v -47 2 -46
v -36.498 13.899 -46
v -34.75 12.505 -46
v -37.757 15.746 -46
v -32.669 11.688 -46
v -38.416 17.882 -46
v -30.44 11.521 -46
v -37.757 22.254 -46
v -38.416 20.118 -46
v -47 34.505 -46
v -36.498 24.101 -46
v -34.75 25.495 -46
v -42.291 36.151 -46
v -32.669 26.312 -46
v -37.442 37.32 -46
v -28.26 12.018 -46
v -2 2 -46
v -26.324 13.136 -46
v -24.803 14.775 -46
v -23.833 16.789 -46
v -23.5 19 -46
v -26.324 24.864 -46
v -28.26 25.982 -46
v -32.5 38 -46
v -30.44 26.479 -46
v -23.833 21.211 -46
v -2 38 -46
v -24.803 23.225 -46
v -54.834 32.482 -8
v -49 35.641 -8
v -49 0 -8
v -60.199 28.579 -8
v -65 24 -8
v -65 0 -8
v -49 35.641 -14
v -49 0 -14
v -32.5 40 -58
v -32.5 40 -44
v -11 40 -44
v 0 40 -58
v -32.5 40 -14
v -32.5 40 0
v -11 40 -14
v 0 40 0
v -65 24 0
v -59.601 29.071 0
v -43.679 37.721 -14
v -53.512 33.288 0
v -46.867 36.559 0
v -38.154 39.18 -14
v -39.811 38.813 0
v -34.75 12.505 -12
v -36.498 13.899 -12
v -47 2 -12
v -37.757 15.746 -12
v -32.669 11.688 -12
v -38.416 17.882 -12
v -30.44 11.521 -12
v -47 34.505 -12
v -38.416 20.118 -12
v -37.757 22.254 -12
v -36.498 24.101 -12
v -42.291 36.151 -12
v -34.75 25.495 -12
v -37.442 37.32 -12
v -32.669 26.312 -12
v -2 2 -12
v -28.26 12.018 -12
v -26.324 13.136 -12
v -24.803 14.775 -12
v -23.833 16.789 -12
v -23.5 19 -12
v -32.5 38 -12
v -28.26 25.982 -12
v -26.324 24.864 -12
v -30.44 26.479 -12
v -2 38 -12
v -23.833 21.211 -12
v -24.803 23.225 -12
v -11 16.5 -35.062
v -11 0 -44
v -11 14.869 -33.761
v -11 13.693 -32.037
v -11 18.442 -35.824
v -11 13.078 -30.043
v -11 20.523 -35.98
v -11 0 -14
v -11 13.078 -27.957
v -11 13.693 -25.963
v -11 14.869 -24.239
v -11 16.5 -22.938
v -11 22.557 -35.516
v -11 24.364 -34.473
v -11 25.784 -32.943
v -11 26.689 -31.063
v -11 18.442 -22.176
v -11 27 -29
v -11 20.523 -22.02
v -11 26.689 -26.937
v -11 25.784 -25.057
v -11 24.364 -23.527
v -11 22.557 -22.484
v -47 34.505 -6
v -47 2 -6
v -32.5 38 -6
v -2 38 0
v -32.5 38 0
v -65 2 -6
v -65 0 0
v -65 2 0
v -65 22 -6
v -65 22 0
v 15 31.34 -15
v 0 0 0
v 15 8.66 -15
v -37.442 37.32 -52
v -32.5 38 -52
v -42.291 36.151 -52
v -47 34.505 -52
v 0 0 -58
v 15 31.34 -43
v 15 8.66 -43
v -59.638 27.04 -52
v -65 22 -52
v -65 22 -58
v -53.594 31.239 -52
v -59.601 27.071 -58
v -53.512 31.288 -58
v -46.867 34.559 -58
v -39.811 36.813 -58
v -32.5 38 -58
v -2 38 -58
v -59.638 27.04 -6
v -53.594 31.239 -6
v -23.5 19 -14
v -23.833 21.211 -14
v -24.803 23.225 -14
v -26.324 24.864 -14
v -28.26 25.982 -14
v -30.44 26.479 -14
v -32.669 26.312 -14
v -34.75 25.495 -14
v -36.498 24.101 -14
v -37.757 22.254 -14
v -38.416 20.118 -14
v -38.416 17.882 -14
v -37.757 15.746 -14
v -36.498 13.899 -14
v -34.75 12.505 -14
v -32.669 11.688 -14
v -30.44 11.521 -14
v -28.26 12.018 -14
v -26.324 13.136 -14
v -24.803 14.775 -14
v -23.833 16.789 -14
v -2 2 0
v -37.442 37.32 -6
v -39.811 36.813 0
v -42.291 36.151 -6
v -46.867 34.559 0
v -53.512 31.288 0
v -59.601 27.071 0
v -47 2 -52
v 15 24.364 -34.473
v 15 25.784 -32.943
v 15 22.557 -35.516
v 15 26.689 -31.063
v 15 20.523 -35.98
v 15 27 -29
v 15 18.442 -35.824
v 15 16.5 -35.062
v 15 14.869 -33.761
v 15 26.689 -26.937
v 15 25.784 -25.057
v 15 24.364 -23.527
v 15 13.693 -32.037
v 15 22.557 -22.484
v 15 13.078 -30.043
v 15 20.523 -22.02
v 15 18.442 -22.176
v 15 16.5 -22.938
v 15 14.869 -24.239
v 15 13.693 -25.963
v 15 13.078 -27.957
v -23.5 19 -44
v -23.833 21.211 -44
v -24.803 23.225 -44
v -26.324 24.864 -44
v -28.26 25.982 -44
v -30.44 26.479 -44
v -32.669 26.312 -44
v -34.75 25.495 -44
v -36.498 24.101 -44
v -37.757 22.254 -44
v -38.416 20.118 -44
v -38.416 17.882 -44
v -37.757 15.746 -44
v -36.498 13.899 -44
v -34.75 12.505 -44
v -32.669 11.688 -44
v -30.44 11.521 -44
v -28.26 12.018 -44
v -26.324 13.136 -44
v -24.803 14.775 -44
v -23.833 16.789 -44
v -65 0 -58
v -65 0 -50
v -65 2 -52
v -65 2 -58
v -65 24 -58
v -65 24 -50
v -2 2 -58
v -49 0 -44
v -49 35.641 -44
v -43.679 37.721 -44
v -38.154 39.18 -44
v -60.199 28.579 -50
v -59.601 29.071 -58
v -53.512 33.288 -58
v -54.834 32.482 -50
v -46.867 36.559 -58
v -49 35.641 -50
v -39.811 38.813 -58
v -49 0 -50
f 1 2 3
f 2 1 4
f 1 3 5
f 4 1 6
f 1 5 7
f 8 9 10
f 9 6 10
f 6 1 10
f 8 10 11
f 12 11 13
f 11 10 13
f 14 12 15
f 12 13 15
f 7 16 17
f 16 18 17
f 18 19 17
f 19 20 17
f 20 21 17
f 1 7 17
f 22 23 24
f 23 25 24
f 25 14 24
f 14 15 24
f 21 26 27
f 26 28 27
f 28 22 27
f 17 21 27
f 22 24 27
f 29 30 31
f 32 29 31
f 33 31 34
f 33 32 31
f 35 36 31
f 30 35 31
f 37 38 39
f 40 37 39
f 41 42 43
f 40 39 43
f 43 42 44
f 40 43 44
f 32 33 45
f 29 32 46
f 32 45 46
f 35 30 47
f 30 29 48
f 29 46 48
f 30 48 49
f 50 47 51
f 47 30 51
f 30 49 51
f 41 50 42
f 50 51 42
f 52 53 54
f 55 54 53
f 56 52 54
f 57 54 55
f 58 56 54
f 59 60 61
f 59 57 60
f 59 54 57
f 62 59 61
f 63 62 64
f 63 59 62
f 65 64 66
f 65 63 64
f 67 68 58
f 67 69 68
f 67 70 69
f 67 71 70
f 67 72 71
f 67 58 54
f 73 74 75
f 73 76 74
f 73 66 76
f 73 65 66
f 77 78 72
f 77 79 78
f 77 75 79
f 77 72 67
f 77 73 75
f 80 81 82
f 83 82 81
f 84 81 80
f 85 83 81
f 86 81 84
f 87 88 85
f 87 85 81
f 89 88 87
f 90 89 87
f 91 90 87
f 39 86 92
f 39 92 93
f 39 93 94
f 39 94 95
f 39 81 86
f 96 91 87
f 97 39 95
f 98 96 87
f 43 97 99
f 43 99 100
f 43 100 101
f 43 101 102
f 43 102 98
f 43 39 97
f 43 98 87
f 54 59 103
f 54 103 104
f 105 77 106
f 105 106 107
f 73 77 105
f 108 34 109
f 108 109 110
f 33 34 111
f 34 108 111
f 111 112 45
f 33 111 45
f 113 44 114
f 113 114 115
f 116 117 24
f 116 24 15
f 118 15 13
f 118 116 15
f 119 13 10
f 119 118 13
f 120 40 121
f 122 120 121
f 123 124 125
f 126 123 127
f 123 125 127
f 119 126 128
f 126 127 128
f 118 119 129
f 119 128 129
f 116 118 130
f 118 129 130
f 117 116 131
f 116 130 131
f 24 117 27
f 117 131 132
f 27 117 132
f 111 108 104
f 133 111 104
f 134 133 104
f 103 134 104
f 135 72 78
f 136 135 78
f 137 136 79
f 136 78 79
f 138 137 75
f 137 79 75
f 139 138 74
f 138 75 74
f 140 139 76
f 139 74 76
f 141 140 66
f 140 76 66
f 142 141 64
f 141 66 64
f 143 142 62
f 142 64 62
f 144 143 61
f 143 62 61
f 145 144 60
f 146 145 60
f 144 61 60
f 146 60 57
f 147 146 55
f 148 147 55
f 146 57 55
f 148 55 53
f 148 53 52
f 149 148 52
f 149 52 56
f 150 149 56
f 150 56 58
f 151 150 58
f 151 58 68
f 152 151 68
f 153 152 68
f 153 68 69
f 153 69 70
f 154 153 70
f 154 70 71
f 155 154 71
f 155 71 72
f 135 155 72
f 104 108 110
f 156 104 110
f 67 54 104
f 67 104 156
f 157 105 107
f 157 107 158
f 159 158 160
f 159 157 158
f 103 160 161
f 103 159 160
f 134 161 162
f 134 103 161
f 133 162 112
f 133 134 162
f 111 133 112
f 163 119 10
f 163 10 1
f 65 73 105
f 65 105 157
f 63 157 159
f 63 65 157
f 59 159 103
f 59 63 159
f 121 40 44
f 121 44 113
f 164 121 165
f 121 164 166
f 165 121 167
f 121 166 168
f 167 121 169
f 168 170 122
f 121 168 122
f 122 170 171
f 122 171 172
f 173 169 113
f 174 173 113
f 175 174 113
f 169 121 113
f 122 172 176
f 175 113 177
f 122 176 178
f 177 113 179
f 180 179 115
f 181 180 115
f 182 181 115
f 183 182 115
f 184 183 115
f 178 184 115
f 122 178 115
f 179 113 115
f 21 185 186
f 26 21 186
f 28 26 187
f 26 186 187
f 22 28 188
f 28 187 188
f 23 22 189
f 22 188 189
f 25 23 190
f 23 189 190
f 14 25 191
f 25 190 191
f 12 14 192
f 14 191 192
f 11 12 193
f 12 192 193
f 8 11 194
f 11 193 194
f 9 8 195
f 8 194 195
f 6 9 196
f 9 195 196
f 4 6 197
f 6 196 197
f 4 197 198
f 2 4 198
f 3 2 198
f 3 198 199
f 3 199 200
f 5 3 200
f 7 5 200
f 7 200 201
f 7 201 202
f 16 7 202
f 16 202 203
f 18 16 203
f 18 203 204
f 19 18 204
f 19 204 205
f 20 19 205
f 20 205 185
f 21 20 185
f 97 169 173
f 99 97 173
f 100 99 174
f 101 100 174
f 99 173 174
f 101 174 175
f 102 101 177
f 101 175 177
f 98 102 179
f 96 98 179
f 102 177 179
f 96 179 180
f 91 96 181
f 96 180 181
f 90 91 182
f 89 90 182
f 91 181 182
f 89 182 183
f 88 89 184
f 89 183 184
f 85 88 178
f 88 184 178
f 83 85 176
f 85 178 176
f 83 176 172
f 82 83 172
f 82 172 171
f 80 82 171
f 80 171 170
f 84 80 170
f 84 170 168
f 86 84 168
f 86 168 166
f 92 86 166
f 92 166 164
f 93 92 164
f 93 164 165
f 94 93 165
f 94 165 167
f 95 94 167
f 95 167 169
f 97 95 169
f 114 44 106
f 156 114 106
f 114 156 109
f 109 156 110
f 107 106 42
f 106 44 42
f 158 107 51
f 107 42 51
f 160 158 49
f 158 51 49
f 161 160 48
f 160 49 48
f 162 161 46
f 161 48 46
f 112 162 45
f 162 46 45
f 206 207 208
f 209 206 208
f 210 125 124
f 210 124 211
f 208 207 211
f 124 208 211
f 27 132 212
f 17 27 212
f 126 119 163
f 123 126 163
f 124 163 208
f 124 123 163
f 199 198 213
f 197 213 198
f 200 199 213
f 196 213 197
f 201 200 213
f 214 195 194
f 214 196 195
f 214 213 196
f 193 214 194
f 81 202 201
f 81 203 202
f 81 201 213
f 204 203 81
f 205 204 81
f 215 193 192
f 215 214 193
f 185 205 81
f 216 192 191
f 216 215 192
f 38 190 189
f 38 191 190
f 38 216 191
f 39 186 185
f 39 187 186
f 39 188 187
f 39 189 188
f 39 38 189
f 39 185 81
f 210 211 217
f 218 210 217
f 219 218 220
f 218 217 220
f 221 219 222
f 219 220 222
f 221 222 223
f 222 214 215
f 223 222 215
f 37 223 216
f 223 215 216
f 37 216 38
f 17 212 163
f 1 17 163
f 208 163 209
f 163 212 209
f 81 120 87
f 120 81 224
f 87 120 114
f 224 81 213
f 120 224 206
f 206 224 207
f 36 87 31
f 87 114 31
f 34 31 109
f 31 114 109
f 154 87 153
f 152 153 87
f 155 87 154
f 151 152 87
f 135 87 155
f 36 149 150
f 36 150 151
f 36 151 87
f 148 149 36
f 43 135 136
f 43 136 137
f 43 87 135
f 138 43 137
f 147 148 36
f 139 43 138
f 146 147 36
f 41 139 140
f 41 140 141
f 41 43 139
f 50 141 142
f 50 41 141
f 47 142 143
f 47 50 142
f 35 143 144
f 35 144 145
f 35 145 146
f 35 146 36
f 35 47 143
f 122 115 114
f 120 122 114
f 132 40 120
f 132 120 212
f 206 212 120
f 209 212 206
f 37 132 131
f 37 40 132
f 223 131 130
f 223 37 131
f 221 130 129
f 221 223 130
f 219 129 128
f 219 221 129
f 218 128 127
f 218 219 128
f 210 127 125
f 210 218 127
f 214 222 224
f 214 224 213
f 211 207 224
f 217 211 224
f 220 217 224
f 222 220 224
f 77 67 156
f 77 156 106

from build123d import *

# Parameters (mm, degrees)
SKETCH1_R               = 7.5
BOSS_EXTRUDE1_DEPTH     = 58
CUT_EXTRUDE1_DEPTH      = 58
SKETCH4_R               = 7
CUT_EXTRUDE2_DEPTH      = 58
CUT_EXTRUDE3_DEPTH      = 96.859271852
CUT_EXTRUDE3_DEPTH_BACK = 6
SKETCH5_R               = 7.5
CUT_EXTRUDE5_START      = -6
CUT_EXTRUDE5_DEPTH      = 6
CUT_EXTRUDE6_DEPTH      = 6
CUT_EXTRUDE7_DEPTH      = 6


with BuildPart() as part:
    # Sketch1 → Boss-Extrude1 (new body)
    with BuildSketch(Plane.XY):
        with BuildLine():
            Line((0, 0), (-65, 0))
            Line((-65, 0), (-65, 24))
            ThreePointArc((-65, 24), (-50.249936753, 35.04674653), (-32.5, 40))
            Line((-32.5, 40), (0, 40))
            Line((0, 40), (15, 31.339745962))
            Line((15, 31.339745962), (15, 8.660254038))
            Line((15, 8.660254038), (0, 0))
        make_face()
        with Locations((-31, 19)):
            Circle(SKETCH1_R, mode=Mode.SUBTRACT)
    extrude(amount=-BOSS_EXTRUDE1_DEPTH)

    # Sketch3 → Cut-Extrude1 (cut)
    with BuildSketch(Plane(origin=(0, 40, 0), x_dir=(1, 0, 0), z_dir=(0, 1, 0))):
        Polygon((-65, 50), (-49, 50), (-49, 44), (-11, 44), (-11, 14), (-49, 14), (-49, 8), (-65, 8), align=None)
        Polygon((0, 58), (15, 43), (15, 58), align=None)
        Polygon((0, 0), (15, 15), (15, 0), align=None)
    extrude(amount=-CUT_EXTRUDE1_DEPTH, mode=Mode.SUBTRACT)

    # Sketch4 → Cut-Extrude2 (cut)
    with BuildSketch(Plane(origin=(15, 0, 0), x_dir=(0, 0, -1), z_dir=(1, 0, 0))):
        with Locations(Location((29, 20, 0), (0, 0, 90))):
            Circle(SKETCH4_R)
    extrude(amount=-CUT_EXTRUDE2_DEPTH, mode=Mode.SUBTRACT)

    # Sketch5 → Cut-Extrude3 (cut, two sides: drawn at the far end of the back side and taken through both)
    with BuildSketch(Plane.XY.offset(-CUT_EXTRUDE3_DEPTH_BACK)):
        with BuildLine():
            Line((-65, 22), (-65, 2))
            Line((-65, 2), (-2, 2))
            Line((-2, 2), (-2, 38))
            Line((-2, 38), (-32.5, 38))
            ThreePointArc((-32.5, 38), (-50.249936753, 33.04674653), (-65, 22))
        make_face()
        with Locations((-31, 19)):
            Circle(SKETCH5_R, mode=Mode.SUBTRACT)
    extrude(amount=CUT_EXTRUDE3_DEPTH + CUT_EXTRUDE3_DEPTH_BACK, mode=Mode.SUBTRACT)

    # Sketch7 → Cut-Extrude5 (cut)
    with BuildSketch(Plane.XY.offset(-6).offset(CUT_EXTRUDE5_START)):
        with BuildLine():
            Line((-47, 34.505277409), (-47, 2))
            Line((-47, 2), (-2, 2))
            Line((-2, 2), (-2, 38))
            Line((-2, 38), (-32.5, 38))
            ThreePointArc((-32.5, 38), (-39.881044096, 36.796355507), (-47, 34.505277409))
        make_face()
    extrude(amount=CUT_EXTRUDE5_DEPTH, mode=Mode.SUBTRACT)

    # Sketch8 → Cut-Extrude6 (cut)
    with BuildSketch(Plane(origin=(0, 0, -58), x_dir=(-1, 0, 0), z_dir=(0, 0, -1))):
        with BuildLine():
            Line((2, 2), (65, 2))
            Line((65, 2), (65, 22))
            ThreePointArc((65, 22), (50.249936753, 33.04674653), (32.5, 38))
            Line((32.5, 38), (2, 38))
            Line((2, 38), (2, 2))
        make_face()
    extrude(amount=-CUT_EXTRUDE6_DEPTH, mode=Mode.SUBTRACT)

    # Sketch9 → Cut-Extrude7 (cut)
    with BuildSketch(Plane(origin=(0, 0, -52), x_dir=(-1, 0, 0), z_dir=(0, 0, -1))):
        with BuildLine():
            Line((47, 34.505277409), (47, 2))
            Line((47, 2), (2, 2))
            Line((2, 2), (2, 38))
            Line((2, 38), (32.5, 38))
            ThreePointArc((32.5, 38), (39.881044096, 36.796355507), (47, 34.505277409))
        make_face()
    extrude(amount=-CUT_EXTRUDE7_DEPTH, mode=Mode.SUBTRACT)


solid = part.part
